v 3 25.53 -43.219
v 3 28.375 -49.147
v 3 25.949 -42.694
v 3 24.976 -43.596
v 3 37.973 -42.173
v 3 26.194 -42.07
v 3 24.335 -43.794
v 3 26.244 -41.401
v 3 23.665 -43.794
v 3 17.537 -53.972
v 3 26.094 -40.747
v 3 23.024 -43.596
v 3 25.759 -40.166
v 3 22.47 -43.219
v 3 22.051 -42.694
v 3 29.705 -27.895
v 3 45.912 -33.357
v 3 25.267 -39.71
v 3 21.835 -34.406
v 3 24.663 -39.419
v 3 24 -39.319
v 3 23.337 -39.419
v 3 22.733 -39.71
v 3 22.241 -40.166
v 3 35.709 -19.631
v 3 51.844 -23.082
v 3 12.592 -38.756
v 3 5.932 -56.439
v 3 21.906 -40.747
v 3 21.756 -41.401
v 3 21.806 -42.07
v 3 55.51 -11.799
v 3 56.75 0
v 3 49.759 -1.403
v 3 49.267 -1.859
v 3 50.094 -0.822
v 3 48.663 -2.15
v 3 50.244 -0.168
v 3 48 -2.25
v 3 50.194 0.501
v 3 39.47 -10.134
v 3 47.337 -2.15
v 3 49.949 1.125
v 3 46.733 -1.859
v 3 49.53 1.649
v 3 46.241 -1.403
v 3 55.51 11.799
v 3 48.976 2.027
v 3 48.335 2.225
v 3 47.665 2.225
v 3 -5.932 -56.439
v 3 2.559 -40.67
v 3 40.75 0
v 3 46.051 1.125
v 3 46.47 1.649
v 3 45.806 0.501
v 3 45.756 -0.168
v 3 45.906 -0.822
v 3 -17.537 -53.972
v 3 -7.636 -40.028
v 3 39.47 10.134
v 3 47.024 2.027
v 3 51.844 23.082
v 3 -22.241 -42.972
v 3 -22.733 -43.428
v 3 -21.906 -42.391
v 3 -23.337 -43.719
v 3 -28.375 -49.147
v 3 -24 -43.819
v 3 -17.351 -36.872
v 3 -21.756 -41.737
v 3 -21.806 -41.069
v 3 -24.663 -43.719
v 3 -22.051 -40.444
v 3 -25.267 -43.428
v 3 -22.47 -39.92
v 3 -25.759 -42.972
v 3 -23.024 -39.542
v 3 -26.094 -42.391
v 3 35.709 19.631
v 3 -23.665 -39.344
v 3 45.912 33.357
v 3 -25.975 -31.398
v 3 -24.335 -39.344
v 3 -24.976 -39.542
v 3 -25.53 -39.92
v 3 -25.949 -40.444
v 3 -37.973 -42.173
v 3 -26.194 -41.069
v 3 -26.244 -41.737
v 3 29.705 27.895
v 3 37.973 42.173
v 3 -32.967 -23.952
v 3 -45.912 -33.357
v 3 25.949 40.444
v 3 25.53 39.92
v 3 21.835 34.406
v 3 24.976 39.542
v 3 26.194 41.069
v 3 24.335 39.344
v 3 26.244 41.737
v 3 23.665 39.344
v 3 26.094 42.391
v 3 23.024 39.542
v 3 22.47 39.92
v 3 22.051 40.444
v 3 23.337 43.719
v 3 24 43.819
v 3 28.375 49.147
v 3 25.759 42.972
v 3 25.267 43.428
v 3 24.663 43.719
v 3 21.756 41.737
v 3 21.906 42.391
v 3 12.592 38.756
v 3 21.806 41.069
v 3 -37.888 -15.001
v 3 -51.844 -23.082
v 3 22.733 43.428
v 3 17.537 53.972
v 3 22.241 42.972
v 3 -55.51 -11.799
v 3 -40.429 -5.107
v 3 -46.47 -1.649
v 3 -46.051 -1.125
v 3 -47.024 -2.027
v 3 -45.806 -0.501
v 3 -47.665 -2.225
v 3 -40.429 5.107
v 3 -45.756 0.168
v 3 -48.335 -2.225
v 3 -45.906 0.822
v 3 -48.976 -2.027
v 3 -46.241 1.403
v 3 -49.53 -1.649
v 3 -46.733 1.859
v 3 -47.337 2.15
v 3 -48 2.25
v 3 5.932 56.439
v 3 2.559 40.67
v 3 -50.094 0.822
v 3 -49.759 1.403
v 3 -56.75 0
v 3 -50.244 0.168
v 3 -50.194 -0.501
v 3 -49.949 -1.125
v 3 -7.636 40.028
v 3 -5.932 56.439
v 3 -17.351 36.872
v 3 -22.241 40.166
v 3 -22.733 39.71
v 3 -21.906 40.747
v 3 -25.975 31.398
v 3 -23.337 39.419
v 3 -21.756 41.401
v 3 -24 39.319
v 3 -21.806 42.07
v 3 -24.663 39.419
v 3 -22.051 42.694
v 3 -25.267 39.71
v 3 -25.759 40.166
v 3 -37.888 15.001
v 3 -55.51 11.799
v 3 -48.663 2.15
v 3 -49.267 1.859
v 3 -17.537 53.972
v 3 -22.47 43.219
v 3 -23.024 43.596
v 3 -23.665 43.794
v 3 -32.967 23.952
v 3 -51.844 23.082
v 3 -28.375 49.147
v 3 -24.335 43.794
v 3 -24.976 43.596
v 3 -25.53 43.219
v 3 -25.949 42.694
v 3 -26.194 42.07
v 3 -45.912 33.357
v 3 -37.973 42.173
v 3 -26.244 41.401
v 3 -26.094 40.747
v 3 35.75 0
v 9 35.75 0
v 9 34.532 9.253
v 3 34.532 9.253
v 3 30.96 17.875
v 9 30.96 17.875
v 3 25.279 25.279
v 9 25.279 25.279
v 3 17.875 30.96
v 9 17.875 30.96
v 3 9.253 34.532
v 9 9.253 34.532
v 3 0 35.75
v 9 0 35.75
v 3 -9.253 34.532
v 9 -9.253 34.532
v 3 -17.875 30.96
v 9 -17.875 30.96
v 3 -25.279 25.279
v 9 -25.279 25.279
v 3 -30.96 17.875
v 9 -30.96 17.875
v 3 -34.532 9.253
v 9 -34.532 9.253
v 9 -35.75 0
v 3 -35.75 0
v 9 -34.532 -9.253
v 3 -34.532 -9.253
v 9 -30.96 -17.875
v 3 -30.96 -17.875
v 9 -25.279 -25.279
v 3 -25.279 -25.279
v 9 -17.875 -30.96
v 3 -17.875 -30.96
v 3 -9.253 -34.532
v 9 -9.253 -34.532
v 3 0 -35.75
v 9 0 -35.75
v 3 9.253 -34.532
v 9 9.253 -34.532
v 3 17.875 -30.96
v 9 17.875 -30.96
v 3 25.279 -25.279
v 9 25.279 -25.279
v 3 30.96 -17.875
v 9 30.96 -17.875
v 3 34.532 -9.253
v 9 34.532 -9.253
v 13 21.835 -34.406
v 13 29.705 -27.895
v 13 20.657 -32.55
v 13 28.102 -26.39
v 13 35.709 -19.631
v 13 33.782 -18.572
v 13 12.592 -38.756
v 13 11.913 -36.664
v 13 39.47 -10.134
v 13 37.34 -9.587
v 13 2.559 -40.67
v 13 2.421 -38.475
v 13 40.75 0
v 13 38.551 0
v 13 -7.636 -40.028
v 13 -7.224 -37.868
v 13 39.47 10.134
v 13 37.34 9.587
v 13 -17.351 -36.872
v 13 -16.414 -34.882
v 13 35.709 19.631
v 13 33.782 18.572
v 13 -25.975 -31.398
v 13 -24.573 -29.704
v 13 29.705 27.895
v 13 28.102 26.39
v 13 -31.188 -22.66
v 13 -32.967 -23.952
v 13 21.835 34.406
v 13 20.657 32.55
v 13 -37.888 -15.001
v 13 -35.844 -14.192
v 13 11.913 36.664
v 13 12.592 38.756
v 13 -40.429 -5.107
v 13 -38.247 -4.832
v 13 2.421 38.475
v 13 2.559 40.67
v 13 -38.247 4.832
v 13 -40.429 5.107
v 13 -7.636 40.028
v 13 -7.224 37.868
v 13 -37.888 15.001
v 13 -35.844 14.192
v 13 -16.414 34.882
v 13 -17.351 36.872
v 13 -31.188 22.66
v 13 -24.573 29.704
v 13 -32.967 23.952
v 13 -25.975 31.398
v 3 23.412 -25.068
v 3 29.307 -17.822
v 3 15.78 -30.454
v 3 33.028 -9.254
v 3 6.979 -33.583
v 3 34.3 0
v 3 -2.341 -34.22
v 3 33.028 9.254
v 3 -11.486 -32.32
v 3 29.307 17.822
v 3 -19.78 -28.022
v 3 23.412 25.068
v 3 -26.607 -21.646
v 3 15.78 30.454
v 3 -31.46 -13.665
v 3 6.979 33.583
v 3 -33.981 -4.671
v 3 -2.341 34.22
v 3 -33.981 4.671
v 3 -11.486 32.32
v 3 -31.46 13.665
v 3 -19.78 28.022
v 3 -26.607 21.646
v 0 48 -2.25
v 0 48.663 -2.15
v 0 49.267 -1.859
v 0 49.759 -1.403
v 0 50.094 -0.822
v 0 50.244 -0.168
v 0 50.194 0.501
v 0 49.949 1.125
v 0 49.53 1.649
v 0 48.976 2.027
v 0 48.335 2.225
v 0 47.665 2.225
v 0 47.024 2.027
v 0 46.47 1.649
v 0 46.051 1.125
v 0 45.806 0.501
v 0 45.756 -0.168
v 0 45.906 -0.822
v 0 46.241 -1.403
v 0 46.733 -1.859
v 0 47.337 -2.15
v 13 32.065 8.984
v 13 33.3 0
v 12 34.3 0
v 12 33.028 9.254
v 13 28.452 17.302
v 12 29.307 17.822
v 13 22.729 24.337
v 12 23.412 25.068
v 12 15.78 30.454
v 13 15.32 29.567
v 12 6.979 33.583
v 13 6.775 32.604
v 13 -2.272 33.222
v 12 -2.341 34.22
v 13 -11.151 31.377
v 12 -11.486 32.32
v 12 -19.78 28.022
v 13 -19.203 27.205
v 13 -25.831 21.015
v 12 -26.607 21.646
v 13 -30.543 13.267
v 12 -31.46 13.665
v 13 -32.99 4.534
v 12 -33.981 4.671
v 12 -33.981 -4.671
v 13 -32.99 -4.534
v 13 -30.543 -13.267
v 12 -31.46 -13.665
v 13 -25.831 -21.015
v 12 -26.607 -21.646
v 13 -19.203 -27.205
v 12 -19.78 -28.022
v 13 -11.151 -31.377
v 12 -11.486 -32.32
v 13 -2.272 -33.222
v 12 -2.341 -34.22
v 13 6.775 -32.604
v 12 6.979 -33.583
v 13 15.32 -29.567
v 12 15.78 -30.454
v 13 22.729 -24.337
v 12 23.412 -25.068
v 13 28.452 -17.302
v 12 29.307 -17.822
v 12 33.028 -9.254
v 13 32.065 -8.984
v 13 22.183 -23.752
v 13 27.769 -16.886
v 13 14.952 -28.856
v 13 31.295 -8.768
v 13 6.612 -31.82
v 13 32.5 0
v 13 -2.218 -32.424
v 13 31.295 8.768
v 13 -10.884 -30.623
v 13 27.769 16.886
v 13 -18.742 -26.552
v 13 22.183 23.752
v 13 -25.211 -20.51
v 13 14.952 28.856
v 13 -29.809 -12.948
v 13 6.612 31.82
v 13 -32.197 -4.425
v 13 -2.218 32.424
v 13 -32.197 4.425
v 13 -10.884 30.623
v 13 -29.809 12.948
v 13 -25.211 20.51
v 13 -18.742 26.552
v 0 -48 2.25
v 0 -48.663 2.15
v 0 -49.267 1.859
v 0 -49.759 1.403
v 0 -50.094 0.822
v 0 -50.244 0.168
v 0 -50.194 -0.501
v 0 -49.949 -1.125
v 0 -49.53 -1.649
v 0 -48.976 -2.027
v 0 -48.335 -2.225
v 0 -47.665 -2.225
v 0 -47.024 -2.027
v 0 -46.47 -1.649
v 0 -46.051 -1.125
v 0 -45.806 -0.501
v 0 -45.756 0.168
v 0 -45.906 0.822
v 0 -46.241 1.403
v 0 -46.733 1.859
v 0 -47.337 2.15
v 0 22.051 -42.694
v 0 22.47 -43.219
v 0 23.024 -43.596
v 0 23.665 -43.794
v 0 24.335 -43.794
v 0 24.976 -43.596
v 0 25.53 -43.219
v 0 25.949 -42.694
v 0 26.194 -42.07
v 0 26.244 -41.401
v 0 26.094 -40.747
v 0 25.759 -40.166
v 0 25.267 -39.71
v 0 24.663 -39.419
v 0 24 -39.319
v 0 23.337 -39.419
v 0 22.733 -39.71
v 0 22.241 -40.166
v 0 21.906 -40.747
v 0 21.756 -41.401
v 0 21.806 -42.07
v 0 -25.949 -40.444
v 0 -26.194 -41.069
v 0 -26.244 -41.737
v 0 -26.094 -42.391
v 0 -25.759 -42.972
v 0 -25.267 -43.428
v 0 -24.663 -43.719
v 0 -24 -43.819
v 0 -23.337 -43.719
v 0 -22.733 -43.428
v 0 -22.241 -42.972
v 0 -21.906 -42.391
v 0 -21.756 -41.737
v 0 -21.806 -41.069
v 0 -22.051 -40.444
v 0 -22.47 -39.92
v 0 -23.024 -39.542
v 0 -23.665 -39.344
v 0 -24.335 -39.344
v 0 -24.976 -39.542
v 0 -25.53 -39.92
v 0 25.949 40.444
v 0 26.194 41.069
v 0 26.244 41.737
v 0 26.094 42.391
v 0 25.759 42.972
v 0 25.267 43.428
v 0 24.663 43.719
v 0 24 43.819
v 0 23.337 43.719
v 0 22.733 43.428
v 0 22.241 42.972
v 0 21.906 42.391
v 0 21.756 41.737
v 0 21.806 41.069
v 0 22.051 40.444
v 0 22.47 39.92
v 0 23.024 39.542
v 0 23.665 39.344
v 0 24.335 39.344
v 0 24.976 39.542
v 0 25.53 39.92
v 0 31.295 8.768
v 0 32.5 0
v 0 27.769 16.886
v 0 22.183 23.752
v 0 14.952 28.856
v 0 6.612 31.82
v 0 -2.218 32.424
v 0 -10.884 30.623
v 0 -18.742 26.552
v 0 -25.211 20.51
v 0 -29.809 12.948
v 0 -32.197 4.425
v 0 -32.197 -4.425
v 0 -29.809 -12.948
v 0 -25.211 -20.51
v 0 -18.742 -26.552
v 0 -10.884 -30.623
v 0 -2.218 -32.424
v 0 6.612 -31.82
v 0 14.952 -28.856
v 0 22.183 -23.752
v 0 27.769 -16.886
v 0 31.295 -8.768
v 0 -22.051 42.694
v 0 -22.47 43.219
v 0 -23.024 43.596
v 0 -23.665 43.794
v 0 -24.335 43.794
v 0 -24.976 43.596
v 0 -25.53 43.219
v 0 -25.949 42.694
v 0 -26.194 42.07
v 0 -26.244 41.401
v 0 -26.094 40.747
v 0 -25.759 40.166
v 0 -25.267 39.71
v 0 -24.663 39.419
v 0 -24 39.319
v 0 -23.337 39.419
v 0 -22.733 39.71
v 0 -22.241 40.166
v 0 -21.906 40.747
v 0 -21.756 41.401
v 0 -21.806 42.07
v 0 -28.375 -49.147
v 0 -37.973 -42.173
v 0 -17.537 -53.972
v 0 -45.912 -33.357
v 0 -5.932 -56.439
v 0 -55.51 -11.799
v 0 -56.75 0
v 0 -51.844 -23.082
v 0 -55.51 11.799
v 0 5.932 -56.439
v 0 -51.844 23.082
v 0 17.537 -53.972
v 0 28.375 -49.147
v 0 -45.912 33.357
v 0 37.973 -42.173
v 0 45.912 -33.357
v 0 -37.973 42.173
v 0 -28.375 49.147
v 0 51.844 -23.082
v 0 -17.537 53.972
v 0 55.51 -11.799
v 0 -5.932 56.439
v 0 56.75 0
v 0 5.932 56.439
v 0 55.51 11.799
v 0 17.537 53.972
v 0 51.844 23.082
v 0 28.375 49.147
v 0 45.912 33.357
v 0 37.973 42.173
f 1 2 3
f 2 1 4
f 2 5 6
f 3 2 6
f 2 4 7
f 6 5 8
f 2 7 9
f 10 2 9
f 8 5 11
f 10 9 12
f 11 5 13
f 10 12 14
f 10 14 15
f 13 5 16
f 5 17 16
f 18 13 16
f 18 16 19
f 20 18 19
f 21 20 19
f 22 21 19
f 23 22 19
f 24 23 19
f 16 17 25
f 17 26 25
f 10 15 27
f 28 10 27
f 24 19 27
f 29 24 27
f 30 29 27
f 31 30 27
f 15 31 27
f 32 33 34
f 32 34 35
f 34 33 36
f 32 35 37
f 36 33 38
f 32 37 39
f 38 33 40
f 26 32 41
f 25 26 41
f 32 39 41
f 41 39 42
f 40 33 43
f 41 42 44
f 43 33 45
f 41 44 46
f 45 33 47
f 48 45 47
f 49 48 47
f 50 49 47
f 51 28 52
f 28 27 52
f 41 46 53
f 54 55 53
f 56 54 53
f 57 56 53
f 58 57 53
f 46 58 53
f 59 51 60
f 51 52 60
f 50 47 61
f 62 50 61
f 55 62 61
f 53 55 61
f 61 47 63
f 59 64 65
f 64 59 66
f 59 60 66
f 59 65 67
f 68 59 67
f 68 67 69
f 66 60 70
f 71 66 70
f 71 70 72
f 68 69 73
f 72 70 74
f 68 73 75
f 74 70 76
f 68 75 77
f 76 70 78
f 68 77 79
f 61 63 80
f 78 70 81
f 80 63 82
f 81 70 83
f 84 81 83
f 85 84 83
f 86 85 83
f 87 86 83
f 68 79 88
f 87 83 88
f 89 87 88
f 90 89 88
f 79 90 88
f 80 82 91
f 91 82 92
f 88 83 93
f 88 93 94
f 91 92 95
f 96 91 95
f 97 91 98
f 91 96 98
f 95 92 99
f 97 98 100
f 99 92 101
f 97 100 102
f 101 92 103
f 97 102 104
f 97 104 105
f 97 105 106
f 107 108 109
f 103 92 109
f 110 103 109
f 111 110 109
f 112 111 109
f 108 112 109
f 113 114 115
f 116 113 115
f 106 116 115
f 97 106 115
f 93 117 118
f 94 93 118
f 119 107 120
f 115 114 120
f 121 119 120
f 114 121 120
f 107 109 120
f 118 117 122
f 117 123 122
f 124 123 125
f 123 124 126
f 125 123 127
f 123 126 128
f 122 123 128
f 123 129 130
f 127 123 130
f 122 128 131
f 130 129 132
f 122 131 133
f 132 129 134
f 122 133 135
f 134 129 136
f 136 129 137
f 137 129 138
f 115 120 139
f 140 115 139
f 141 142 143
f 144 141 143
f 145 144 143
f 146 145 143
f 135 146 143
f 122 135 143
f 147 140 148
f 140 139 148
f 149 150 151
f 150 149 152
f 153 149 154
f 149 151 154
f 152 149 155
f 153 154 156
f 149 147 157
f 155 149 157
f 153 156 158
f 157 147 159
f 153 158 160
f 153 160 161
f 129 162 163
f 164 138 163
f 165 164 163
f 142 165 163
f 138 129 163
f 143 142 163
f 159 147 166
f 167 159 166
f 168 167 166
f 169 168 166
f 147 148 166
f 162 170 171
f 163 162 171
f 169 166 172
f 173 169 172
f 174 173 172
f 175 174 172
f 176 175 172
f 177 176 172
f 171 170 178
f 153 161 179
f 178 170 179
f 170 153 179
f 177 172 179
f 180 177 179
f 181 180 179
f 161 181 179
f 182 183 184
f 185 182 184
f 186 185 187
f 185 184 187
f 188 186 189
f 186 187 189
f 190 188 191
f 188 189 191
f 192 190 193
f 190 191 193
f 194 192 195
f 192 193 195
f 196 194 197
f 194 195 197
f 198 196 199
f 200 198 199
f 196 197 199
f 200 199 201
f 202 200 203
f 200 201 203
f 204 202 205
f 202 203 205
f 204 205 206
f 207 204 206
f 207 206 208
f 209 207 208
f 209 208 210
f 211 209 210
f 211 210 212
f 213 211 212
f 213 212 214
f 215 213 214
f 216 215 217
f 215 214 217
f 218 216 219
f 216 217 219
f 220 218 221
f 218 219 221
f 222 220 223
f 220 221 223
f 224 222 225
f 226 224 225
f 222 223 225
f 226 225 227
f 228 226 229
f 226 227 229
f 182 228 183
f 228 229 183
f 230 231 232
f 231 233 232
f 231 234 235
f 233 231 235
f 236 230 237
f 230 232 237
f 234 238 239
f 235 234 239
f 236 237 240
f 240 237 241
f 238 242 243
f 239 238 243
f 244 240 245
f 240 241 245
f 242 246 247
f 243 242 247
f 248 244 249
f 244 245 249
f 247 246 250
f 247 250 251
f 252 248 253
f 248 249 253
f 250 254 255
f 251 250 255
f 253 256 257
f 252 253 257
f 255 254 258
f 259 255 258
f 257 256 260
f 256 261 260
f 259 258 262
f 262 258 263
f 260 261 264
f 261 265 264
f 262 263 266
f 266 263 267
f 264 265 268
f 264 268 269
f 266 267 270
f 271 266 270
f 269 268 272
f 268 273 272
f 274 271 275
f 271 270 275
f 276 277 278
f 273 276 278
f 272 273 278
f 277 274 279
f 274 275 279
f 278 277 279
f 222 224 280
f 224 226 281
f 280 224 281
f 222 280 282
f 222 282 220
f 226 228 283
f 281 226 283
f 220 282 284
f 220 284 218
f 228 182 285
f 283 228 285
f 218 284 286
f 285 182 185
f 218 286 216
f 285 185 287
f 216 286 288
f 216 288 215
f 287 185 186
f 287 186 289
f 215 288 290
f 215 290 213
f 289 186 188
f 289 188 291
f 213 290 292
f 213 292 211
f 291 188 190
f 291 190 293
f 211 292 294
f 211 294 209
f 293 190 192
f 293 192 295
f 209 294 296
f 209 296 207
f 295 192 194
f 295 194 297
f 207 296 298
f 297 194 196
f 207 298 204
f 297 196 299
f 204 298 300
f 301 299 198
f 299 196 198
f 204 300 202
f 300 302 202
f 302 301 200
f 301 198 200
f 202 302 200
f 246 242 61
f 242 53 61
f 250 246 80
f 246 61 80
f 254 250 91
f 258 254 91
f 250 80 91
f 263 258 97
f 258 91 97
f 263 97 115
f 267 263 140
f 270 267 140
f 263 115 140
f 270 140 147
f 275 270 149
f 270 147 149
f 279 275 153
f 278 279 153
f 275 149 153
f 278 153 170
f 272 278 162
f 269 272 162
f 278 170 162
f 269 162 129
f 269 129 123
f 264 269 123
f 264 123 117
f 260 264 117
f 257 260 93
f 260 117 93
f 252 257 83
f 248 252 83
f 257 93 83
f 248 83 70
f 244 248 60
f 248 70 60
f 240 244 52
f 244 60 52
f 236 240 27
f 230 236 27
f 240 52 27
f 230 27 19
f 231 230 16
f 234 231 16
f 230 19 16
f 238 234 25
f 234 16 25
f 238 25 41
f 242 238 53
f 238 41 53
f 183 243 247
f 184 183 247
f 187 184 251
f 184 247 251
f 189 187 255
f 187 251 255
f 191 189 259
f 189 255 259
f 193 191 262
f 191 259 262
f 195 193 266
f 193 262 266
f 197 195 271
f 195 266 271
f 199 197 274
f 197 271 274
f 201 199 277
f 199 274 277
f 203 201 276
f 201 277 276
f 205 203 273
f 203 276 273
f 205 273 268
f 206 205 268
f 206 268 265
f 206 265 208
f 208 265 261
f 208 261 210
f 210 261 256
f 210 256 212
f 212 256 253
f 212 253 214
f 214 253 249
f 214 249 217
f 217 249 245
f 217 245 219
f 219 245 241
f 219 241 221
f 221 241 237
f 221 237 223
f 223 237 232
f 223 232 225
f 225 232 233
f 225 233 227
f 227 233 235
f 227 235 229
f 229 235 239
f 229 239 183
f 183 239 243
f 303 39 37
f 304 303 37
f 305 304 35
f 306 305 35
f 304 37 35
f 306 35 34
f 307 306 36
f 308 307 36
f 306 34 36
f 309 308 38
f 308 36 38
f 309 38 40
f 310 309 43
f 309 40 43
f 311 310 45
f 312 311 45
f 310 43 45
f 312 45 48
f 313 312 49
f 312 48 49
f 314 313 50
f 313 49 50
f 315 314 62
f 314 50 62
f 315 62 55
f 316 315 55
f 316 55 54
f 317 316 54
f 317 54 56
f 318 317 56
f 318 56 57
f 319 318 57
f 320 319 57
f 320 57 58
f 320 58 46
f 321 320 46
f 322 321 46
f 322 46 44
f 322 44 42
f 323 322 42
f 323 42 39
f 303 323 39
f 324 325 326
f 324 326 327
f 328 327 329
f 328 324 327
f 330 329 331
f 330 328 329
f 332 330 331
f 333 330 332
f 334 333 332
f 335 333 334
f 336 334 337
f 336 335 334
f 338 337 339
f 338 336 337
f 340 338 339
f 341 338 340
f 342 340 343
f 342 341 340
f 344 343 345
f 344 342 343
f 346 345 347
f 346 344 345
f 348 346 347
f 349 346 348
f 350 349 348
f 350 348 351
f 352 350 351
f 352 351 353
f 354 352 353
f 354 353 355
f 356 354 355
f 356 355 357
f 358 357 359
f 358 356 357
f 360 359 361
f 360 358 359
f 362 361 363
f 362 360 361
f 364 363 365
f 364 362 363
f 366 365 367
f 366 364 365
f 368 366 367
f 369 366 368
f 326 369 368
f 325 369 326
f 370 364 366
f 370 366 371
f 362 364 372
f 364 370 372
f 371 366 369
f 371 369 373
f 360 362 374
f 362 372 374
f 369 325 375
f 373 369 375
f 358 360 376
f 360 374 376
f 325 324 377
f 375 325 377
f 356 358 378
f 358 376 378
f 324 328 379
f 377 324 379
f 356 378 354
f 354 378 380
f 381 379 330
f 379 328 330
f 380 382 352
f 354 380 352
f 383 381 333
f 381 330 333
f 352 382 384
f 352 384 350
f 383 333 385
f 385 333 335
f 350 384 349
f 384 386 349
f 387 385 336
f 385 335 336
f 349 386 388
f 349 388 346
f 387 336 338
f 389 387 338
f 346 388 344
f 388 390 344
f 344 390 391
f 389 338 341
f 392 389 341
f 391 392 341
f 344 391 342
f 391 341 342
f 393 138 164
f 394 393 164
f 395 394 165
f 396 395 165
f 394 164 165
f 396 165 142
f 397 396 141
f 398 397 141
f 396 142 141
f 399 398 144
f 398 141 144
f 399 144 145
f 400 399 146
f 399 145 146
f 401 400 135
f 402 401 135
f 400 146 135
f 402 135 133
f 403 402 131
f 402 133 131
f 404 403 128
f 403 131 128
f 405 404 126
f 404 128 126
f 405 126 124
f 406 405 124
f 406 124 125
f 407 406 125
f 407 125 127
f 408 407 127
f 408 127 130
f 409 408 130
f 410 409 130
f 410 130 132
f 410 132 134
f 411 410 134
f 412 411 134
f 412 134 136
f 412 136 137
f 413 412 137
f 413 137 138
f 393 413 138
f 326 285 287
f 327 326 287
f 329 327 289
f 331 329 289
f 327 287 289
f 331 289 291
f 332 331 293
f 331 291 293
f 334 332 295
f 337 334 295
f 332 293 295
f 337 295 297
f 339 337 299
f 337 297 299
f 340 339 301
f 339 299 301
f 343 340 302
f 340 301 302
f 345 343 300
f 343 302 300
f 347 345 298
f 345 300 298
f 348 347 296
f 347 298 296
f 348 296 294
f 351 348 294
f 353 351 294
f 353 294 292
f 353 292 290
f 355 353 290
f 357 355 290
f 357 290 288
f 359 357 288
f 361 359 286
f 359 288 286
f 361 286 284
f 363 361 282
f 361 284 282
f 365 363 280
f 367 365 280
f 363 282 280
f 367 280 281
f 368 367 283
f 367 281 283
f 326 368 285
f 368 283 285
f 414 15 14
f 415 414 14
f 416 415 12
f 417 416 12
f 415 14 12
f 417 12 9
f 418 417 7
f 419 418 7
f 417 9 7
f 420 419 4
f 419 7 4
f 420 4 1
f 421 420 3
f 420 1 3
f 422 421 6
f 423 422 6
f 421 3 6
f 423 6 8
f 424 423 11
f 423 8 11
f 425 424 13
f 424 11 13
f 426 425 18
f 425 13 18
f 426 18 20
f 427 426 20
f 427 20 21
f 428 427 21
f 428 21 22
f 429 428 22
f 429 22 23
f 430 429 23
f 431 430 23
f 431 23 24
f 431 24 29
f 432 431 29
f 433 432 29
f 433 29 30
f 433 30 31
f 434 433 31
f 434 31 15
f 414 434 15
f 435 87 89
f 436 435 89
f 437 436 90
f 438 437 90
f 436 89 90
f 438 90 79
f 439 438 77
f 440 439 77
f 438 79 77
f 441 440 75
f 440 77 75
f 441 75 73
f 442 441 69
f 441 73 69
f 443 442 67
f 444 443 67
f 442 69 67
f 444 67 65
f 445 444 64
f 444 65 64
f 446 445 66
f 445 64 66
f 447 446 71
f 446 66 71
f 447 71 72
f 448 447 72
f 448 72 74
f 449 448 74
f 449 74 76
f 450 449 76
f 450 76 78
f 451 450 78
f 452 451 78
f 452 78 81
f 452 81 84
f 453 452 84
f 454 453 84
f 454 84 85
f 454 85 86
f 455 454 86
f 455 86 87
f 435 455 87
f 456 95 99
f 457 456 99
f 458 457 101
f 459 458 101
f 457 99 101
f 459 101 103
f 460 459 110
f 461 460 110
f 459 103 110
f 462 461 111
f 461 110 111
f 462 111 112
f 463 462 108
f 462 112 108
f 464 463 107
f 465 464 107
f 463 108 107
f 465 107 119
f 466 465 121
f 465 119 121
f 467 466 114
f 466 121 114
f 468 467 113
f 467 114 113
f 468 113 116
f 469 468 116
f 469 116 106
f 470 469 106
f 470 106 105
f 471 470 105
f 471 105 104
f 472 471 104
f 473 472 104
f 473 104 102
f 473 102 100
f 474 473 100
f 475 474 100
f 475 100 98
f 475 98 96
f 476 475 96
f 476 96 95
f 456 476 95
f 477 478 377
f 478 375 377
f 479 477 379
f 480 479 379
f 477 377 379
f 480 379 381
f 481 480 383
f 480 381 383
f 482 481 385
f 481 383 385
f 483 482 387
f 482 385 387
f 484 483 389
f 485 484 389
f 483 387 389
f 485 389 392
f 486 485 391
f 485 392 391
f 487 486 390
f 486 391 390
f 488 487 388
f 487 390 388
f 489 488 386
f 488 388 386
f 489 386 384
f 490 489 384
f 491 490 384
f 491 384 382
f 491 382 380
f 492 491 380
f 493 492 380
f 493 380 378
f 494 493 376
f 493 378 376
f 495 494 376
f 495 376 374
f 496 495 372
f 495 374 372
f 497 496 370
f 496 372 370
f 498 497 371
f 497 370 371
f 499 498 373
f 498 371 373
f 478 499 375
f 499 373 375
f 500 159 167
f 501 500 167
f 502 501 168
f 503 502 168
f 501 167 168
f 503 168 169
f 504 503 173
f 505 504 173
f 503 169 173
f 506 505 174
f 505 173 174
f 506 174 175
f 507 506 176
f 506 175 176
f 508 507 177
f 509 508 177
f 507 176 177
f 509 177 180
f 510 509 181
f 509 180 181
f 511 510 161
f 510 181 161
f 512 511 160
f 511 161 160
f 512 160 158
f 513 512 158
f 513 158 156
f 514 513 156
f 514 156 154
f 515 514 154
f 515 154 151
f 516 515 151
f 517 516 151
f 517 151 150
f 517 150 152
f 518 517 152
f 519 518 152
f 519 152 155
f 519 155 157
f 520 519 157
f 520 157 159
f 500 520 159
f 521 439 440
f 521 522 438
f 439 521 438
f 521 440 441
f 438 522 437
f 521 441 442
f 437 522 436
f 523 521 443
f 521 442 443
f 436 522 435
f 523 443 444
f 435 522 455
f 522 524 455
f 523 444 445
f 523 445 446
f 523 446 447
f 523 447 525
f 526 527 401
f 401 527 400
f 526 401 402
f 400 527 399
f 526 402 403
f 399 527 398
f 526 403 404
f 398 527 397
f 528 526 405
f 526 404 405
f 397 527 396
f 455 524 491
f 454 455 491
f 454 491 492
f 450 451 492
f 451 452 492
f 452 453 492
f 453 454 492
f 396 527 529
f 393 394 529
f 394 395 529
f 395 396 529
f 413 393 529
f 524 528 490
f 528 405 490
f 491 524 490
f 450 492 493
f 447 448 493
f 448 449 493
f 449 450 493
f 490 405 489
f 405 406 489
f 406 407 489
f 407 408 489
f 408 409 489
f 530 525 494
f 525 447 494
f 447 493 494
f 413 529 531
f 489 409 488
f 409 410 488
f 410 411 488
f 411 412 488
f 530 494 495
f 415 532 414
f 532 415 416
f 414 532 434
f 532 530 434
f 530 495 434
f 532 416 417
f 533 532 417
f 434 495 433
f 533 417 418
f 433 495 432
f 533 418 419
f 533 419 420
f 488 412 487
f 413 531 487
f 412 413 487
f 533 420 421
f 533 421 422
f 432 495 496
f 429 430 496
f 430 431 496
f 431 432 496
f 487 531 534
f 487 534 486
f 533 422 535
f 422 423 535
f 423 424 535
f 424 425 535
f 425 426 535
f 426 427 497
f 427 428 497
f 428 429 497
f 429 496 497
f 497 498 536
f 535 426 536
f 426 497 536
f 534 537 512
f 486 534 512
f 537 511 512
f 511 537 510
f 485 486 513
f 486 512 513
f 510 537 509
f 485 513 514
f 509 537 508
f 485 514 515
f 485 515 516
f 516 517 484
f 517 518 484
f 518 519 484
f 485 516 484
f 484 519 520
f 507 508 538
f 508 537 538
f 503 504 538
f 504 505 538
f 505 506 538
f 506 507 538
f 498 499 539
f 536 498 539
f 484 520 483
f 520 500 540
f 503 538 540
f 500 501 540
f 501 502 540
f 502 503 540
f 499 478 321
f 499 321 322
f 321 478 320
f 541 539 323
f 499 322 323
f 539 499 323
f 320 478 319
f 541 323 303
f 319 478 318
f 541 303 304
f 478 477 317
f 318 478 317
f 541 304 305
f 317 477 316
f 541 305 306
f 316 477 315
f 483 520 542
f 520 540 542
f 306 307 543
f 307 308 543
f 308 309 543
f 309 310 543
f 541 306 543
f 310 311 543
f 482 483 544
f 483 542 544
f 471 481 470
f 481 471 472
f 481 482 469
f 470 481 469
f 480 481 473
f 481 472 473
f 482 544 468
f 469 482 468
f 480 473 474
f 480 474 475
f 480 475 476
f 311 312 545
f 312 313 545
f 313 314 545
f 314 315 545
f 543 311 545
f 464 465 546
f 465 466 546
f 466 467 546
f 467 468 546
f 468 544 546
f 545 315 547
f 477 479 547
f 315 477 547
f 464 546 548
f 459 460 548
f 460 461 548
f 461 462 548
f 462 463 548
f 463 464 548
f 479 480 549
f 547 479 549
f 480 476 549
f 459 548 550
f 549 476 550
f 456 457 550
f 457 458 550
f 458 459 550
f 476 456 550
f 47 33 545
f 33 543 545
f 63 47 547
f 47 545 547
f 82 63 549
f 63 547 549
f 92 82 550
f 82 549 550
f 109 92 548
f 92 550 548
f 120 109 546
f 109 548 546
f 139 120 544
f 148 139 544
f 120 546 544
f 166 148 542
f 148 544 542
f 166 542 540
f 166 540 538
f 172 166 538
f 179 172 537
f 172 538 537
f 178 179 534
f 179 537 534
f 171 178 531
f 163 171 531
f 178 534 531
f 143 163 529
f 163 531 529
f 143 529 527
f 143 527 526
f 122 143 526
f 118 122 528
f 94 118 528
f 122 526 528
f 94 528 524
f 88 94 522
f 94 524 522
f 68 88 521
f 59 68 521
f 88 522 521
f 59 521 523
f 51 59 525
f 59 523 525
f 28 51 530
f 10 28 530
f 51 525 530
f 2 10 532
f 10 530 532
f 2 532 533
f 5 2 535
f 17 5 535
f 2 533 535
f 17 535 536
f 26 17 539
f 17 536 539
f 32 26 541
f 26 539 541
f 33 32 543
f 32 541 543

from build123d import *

# Parameters (mm, degrees)
CHAMFER1_SIZE      = 4
CHAMFER1_SIZE2     = 2.800830153
CHAMFER2_SIZE      = 1
SKETCH2_R          = 2.25
CUT_EXTRUDE1_DEPTH = 10
CIRPATTERN1_COUNT  = 6


with BuildPart() as part:
    # Sketch1 → Revolve1 (revolve)
    with BuildSketch(Plane.XY):
        Polygon((0, 32.5), (13, 32.5), (13, 34.3), (3, 34.3), (3, 35.75), (13, 35.75), (13, 40.75), (3, 40.75), (3, 56.75), (0, 56.75), align=None)
    revolve(axis=Axis((0, 0, 0), (1, 0, 0)))

    # Chamfer1
    chamfer1_edges = [part.edges().sort_by_distance(p)[0] for p in [
        (13, -35.75, 0),
    ]]
    chamfer1_side = [part.faces().sort_by_distance(p)[0] for p in [
        (8, -35.75, 0),
    ]]
    chamfer(chamfer1_edges, length=CHAMFER1_SIZE, length2=CHAMFER1_SIZE2, reference=chamfer1_side[0])

    # Chamfer2
    chamfer2_edges = [part.edges().sort_by_distance(p)[0] for p in [
        (13, -34.3, 0),
    ]]
    chamfer(chamfer2_edges, length=CHAMFER2_SIZE)

    # Sketch2 → Cut-Extrude1 (cut)
    with BuildSketch(Plane(origin=(3, 0, 0), x_dir=(0, 0, -1), z_dir=(1, 0, 0))):
        with Locations((0, 48)):
            Circle(SKETCH2_R)
    cut_extrude1 = extrude(amount=-CUT_EXTRUDE1_DEPTH, mode=Mode.SUBTRACT)

    # CirPattern1: Cut-Extrude1 ×6 about axis
    cirpattern1_axis = Axis((0, 0, 0), (1, 0, 0))
    for i in range(1, CIRPATTERN1_COUNT):
        add(cut_extrude1.rotate(cirpattern1_axis, i * 360 / CIRPATTERN1_COUNT), mode=Mode.SUBTRACT)


solid = part.part
